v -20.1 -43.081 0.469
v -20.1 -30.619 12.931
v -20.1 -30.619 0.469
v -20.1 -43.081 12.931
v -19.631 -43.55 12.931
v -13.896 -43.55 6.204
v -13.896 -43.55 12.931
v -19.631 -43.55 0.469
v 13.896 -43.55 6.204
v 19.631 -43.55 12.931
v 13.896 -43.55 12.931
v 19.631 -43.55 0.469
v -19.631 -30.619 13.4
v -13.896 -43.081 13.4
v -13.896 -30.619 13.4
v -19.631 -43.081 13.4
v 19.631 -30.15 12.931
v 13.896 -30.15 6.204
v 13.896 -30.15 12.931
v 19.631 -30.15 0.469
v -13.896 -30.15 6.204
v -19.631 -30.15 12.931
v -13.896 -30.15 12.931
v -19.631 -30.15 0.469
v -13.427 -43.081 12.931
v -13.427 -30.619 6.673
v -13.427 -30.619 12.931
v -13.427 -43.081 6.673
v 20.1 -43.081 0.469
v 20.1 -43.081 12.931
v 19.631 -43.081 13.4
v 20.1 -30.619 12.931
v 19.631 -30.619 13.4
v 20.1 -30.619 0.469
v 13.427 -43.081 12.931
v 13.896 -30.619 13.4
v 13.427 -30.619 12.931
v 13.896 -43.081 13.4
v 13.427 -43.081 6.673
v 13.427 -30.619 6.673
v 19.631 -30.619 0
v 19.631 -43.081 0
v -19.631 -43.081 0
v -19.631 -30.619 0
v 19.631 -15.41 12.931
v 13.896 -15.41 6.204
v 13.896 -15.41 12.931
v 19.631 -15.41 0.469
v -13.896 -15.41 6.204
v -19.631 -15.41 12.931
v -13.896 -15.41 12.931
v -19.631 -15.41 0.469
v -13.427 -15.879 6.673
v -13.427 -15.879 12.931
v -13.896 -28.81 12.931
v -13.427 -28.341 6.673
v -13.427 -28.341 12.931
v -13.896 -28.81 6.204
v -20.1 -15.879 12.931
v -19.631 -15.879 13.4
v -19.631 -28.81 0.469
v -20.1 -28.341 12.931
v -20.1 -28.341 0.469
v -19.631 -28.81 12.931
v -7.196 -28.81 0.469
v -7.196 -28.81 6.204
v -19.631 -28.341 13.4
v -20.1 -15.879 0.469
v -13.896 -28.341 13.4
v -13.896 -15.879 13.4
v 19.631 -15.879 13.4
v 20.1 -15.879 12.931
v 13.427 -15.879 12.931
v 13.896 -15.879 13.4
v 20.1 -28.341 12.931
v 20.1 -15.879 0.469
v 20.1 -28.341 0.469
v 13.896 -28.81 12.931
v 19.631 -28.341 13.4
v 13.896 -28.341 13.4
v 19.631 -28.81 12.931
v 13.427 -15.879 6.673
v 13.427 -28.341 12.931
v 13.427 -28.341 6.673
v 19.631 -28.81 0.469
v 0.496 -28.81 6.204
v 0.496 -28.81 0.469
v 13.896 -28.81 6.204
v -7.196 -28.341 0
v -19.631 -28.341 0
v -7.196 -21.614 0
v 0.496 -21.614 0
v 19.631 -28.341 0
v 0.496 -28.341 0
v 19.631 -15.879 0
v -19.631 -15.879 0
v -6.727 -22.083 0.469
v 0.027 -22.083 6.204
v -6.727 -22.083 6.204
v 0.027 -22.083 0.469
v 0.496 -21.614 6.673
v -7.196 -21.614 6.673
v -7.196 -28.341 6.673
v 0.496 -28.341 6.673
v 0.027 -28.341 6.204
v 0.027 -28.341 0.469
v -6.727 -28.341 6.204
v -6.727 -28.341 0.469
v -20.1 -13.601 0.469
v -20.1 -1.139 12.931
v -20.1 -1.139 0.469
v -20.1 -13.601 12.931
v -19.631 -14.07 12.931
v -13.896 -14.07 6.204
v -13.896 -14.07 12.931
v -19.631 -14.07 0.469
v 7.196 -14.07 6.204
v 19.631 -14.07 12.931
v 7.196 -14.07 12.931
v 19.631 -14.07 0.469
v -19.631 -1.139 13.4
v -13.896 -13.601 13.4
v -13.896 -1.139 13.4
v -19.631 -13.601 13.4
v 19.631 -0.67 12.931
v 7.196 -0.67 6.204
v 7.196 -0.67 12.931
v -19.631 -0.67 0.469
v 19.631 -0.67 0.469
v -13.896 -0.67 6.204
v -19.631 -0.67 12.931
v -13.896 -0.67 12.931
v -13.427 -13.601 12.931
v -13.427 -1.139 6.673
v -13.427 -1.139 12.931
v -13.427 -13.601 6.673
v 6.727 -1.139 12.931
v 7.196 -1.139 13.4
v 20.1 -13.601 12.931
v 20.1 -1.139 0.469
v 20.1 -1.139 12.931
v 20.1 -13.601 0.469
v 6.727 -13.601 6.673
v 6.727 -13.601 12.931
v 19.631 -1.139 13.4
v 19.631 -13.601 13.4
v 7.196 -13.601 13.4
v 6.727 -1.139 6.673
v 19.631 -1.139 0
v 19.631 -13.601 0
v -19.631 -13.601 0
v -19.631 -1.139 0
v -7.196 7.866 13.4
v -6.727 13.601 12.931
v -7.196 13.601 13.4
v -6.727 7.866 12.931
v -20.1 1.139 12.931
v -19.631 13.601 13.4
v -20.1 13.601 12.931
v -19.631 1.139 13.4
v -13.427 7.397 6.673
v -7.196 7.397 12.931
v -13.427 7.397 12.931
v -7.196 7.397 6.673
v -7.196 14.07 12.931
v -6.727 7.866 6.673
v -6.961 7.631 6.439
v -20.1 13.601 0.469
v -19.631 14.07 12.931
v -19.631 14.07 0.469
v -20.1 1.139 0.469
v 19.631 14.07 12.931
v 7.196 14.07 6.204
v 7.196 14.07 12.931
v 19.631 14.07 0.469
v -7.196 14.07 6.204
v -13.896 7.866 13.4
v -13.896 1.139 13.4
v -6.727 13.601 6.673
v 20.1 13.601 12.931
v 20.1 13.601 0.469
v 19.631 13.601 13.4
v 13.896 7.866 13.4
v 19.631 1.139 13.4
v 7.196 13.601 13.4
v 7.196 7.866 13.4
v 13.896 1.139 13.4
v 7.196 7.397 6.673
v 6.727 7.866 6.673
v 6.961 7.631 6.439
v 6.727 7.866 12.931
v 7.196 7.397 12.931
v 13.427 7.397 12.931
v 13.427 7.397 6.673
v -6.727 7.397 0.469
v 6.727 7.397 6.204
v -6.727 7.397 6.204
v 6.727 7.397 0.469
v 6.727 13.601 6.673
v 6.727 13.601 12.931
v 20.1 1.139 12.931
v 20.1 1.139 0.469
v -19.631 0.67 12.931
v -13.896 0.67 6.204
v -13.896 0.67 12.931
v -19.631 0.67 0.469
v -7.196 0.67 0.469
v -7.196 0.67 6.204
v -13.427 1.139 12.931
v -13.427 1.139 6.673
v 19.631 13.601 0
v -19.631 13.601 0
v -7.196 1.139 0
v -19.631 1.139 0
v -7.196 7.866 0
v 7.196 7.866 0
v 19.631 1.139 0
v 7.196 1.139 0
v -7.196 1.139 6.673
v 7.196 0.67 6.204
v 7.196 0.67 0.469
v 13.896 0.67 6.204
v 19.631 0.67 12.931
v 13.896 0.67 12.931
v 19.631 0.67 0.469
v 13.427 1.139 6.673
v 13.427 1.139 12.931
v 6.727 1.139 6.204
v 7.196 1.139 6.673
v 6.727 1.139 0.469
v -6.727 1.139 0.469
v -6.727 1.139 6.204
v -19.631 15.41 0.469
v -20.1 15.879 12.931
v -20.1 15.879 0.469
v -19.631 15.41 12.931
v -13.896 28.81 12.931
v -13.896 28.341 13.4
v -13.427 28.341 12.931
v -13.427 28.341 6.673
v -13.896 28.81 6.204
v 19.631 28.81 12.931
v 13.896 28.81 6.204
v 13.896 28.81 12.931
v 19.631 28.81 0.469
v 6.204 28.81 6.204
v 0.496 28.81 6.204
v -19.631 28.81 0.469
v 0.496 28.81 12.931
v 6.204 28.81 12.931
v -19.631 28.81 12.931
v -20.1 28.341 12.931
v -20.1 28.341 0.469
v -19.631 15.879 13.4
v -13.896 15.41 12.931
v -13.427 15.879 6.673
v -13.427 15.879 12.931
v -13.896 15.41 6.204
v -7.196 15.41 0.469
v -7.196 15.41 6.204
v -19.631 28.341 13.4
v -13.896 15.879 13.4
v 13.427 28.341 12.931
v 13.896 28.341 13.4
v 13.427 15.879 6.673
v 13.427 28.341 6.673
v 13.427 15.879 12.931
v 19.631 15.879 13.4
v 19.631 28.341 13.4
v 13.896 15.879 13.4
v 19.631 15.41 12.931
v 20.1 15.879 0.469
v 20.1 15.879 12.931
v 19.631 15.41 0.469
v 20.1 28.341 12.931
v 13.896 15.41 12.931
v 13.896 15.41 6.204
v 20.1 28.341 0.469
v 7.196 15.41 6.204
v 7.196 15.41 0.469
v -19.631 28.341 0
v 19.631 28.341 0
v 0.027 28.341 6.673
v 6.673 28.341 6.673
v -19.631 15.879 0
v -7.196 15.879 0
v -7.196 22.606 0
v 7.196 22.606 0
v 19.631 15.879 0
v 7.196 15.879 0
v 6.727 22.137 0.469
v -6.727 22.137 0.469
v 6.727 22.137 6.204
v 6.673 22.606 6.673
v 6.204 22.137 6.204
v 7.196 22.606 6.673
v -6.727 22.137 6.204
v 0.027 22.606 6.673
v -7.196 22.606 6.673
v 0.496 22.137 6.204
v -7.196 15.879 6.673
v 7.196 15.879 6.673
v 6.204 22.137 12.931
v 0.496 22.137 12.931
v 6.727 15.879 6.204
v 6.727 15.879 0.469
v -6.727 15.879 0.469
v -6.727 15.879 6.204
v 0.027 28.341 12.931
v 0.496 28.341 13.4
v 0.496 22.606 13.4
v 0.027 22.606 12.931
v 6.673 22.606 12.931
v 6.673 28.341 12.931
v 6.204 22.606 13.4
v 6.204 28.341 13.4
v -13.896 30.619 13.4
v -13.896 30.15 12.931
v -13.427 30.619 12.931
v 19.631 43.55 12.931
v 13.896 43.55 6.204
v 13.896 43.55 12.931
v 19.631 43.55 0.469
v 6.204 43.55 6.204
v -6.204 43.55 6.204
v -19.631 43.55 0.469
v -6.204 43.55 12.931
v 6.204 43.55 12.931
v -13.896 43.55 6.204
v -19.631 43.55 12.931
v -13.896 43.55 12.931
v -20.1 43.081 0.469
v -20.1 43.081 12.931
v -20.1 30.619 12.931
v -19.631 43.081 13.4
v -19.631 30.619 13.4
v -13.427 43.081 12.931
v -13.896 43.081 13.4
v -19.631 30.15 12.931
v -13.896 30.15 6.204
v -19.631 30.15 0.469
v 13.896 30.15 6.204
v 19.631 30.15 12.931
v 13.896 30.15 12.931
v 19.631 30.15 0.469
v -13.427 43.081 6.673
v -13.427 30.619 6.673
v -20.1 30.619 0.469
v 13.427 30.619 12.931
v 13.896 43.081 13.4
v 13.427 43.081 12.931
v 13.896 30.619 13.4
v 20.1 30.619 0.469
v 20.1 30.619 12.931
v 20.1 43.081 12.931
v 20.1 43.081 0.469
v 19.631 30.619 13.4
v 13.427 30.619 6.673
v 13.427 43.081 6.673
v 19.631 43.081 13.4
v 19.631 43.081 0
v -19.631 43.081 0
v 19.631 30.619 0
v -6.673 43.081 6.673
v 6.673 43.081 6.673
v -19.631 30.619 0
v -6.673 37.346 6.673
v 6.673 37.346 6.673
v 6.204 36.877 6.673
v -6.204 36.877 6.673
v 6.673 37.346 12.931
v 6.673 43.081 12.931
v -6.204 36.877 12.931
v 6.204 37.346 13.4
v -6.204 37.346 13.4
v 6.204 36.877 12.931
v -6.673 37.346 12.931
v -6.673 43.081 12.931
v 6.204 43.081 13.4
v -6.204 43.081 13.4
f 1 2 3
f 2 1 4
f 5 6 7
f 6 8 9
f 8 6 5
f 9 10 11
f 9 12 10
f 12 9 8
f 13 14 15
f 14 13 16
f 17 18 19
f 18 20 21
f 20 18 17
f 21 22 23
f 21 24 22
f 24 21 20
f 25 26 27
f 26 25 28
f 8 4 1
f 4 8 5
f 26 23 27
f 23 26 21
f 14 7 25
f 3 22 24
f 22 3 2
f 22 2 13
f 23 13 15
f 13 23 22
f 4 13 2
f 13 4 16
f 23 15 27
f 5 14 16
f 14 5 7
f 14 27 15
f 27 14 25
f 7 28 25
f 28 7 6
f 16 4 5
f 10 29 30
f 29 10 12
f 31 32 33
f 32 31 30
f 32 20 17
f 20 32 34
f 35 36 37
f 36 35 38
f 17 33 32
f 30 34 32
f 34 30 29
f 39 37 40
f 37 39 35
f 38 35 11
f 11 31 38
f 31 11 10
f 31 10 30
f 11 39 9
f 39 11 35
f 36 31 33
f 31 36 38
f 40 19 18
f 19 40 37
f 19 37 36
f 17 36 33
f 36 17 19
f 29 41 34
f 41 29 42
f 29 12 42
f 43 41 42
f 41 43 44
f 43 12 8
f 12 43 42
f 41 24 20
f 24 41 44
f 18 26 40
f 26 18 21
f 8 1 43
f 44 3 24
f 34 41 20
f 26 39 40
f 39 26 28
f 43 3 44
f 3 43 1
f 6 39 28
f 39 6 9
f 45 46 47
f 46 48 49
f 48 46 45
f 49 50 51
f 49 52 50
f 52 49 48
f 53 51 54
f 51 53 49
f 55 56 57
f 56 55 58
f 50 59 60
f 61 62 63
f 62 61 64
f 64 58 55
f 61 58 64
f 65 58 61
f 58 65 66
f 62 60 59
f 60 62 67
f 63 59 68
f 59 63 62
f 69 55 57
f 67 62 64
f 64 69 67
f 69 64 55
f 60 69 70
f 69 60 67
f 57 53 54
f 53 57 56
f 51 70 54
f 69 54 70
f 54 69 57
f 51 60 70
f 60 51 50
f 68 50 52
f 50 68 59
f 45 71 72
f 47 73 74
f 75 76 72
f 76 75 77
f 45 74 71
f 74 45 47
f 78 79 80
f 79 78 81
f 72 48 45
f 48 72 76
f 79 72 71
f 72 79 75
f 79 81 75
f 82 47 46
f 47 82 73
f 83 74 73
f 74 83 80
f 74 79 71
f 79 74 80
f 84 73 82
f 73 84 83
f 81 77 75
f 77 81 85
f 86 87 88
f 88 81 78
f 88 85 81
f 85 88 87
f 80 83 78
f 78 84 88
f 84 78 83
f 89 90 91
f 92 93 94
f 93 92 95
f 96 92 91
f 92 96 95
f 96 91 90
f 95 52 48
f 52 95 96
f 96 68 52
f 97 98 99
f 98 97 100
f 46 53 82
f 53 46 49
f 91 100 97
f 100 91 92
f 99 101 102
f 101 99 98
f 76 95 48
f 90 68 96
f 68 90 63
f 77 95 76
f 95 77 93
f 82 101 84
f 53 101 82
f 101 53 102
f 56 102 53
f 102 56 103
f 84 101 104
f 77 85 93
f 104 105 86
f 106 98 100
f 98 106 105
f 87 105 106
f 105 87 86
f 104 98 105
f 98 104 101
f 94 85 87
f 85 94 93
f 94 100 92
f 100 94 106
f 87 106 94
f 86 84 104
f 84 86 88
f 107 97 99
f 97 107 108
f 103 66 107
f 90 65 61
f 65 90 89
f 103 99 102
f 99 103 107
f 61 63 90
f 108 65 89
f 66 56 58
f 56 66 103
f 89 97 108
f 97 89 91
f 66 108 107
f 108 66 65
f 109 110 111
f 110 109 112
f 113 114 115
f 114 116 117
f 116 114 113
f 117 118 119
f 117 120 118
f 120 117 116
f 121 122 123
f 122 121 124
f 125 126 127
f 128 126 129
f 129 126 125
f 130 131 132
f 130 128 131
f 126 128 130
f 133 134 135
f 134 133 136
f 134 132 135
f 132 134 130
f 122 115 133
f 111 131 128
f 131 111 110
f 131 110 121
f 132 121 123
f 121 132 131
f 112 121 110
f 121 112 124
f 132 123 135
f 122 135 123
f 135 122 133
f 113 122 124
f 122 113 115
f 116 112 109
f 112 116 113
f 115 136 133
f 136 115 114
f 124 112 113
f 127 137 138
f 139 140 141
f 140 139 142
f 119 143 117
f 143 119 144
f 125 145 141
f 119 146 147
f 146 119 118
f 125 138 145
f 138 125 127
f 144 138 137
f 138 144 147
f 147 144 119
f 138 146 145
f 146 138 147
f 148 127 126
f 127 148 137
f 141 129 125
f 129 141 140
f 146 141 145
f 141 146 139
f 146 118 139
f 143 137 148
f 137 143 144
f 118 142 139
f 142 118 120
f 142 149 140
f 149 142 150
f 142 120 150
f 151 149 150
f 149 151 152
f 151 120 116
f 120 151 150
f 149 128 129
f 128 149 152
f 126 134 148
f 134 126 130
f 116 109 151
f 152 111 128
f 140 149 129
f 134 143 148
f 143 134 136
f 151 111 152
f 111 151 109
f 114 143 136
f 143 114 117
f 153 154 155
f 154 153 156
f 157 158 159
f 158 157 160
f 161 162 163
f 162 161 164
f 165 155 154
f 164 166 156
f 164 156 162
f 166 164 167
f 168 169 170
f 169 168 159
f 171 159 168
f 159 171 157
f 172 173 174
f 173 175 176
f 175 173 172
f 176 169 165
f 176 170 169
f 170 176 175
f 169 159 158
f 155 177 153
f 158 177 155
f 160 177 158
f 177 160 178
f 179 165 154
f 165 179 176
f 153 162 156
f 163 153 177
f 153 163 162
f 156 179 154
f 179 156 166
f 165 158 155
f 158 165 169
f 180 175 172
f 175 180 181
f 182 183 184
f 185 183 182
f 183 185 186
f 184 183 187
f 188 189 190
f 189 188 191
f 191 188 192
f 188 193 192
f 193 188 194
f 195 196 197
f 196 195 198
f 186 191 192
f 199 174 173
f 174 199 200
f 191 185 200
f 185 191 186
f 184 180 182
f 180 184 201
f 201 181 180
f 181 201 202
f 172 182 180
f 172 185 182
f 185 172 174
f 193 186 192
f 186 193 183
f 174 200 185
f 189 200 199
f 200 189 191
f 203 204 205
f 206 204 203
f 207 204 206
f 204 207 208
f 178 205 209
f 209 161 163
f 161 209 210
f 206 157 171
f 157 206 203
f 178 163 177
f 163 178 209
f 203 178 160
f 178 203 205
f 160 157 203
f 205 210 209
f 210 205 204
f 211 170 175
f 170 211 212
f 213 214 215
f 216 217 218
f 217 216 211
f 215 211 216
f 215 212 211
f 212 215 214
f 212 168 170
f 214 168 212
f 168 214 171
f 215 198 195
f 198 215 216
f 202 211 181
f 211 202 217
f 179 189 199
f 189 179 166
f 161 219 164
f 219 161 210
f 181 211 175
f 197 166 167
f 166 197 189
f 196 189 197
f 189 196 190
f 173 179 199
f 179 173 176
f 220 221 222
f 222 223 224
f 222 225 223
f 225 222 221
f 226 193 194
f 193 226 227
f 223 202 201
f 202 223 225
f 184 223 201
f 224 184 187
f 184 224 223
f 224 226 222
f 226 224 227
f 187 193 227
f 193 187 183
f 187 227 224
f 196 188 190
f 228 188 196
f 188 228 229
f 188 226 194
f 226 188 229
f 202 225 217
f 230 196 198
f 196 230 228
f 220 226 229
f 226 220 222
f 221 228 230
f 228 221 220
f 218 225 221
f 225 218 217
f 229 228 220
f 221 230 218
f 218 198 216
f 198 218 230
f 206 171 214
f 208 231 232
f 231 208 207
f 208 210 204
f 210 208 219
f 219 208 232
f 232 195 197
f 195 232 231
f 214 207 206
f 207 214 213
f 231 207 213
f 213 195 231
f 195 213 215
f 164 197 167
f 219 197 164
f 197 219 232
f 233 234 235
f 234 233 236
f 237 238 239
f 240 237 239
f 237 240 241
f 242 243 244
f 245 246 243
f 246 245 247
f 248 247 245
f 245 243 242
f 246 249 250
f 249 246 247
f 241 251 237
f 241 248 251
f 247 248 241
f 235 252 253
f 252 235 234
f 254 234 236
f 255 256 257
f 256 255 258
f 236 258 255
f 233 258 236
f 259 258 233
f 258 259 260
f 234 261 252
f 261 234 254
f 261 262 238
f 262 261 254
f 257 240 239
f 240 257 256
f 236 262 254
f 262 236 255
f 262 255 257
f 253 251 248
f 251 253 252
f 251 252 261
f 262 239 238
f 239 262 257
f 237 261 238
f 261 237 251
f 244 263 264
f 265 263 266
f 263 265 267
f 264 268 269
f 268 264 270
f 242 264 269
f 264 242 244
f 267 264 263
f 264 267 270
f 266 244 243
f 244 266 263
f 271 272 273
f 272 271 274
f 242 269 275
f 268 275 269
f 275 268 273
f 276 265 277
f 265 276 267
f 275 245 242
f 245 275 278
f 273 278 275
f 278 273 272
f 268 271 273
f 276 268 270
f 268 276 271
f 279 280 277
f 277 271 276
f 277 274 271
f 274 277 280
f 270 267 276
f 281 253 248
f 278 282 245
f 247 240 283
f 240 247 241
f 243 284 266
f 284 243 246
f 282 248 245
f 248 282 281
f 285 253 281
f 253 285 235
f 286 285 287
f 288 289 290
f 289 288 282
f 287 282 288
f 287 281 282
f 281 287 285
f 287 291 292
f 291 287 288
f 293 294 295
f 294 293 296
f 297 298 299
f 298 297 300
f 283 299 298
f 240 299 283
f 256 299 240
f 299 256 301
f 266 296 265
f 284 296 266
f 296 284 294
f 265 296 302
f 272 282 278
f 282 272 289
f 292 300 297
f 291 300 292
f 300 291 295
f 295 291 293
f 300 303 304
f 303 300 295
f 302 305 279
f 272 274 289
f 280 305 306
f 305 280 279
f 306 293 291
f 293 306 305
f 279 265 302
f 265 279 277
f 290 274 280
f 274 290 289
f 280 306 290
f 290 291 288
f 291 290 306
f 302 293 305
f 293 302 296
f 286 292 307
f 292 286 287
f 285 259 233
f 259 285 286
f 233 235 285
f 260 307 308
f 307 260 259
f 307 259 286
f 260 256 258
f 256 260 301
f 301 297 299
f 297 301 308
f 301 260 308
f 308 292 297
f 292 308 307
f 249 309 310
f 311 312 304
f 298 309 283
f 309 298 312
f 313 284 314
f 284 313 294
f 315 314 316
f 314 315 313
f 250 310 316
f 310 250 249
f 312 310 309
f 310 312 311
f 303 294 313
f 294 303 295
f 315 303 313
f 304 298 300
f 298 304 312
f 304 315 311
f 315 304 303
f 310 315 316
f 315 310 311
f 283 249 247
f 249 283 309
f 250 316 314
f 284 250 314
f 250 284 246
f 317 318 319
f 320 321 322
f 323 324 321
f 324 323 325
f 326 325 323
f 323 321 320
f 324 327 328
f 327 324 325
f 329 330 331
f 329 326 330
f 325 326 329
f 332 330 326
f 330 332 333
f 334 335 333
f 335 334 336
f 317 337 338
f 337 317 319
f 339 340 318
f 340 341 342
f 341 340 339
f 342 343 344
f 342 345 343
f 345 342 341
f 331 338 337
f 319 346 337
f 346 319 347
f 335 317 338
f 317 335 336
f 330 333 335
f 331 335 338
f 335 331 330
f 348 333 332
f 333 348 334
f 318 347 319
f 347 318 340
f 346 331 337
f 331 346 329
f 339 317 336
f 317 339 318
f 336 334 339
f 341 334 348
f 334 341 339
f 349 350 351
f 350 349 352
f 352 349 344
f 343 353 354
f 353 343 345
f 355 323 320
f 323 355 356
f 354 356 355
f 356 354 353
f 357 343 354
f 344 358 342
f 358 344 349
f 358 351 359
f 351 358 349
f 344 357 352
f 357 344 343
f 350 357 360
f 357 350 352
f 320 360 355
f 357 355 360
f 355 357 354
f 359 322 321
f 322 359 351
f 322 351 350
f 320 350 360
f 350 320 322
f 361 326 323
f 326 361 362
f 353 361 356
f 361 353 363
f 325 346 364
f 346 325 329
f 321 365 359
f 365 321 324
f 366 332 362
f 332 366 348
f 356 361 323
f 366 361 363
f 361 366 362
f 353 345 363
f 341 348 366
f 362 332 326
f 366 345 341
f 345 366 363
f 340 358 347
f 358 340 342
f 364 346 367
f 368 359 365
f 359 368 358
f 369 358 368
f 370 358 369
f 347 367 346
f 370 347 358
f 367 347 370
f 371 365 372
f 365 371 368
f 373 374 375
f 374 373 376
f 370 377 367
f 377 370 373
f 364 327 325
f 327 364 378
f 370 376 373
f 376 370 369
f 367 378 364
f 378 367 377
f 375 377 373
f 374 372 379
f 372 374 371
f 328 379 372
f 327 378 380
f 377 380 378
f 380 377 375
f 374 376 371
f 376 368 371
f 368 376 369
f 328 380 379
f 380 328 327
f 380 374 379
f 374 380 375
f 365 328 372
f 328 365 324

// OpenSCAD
a=[[-1.5,-0.5,0.5],[-0.5,-0.5,0.5],[0.5,-0.5,0.5],[1.5,-0.5,0.5],
[-1.5,0.5,0.5],[-0.5,0.5,0.5],[0.5,0.5,0.5],[1.5,0.5,0.5],
[-0.5,-0.5,-0.5],[0.5,-0.5,-0.5],
[-0.5,0.5,-0.5],[0.5,0.5,-0.5]];

module octaeder(size)scale(size)hull()for(i=[0,180])rotate([i,0,0])cylinder(r1=1,r2=0,h=1,$fn=4);

module burr_(x,eps=0,chamfer=0,length=6)
difference(){
cube([length,2,2]-(2*chamfer*[1,1,1]),center=true);
for(i=x)translate(a[i])cube(1+eps+2*chamfer,center=true);
};

module burr(x,eps=0,chamfer=0,length=6)
if(chamfer==0) burr_(x,eps,length=length);
else
minkowski(){octaeder(chamfer);burr_(x,eps,chamfer,length);}

module burrset(b,eps=0,chamfer=0,length=6)
for(i=[0:(len(b)-1)]){
translate([0,(-len(b)/2+i+0.5)*2.2,1.0]) burr(b[i],eps=eps,chamfer=chamfer,length=length);}

b=[
[0,1,2,3,4,6,7,8,9],
[0,1,2,3,4,5,7,8,9],
[1,2,5,8,9],
[0,1,2,4,8,9],
[2,3,6,7],
[1,2,3,6,7,8,9],
[1,2,5,6,8,9]
];
dubois=[
[0,1,2,3,4,5,6,7],
[0,1,2,3,4,5,6,7,8],
[0,1,2,4,5,6],
[0,1,2,3,5,6,8,9],
[0,1,2,3,4,5,7,8,9],
[0,1,2,3,4,7]
];
//scale(13.4/2) burrset(b,eps=0.008,chamfer=0.07,length=6);
scale(13.4/2) burrset(dubois,eps=0.008,chamfer=0.07,length=6);
